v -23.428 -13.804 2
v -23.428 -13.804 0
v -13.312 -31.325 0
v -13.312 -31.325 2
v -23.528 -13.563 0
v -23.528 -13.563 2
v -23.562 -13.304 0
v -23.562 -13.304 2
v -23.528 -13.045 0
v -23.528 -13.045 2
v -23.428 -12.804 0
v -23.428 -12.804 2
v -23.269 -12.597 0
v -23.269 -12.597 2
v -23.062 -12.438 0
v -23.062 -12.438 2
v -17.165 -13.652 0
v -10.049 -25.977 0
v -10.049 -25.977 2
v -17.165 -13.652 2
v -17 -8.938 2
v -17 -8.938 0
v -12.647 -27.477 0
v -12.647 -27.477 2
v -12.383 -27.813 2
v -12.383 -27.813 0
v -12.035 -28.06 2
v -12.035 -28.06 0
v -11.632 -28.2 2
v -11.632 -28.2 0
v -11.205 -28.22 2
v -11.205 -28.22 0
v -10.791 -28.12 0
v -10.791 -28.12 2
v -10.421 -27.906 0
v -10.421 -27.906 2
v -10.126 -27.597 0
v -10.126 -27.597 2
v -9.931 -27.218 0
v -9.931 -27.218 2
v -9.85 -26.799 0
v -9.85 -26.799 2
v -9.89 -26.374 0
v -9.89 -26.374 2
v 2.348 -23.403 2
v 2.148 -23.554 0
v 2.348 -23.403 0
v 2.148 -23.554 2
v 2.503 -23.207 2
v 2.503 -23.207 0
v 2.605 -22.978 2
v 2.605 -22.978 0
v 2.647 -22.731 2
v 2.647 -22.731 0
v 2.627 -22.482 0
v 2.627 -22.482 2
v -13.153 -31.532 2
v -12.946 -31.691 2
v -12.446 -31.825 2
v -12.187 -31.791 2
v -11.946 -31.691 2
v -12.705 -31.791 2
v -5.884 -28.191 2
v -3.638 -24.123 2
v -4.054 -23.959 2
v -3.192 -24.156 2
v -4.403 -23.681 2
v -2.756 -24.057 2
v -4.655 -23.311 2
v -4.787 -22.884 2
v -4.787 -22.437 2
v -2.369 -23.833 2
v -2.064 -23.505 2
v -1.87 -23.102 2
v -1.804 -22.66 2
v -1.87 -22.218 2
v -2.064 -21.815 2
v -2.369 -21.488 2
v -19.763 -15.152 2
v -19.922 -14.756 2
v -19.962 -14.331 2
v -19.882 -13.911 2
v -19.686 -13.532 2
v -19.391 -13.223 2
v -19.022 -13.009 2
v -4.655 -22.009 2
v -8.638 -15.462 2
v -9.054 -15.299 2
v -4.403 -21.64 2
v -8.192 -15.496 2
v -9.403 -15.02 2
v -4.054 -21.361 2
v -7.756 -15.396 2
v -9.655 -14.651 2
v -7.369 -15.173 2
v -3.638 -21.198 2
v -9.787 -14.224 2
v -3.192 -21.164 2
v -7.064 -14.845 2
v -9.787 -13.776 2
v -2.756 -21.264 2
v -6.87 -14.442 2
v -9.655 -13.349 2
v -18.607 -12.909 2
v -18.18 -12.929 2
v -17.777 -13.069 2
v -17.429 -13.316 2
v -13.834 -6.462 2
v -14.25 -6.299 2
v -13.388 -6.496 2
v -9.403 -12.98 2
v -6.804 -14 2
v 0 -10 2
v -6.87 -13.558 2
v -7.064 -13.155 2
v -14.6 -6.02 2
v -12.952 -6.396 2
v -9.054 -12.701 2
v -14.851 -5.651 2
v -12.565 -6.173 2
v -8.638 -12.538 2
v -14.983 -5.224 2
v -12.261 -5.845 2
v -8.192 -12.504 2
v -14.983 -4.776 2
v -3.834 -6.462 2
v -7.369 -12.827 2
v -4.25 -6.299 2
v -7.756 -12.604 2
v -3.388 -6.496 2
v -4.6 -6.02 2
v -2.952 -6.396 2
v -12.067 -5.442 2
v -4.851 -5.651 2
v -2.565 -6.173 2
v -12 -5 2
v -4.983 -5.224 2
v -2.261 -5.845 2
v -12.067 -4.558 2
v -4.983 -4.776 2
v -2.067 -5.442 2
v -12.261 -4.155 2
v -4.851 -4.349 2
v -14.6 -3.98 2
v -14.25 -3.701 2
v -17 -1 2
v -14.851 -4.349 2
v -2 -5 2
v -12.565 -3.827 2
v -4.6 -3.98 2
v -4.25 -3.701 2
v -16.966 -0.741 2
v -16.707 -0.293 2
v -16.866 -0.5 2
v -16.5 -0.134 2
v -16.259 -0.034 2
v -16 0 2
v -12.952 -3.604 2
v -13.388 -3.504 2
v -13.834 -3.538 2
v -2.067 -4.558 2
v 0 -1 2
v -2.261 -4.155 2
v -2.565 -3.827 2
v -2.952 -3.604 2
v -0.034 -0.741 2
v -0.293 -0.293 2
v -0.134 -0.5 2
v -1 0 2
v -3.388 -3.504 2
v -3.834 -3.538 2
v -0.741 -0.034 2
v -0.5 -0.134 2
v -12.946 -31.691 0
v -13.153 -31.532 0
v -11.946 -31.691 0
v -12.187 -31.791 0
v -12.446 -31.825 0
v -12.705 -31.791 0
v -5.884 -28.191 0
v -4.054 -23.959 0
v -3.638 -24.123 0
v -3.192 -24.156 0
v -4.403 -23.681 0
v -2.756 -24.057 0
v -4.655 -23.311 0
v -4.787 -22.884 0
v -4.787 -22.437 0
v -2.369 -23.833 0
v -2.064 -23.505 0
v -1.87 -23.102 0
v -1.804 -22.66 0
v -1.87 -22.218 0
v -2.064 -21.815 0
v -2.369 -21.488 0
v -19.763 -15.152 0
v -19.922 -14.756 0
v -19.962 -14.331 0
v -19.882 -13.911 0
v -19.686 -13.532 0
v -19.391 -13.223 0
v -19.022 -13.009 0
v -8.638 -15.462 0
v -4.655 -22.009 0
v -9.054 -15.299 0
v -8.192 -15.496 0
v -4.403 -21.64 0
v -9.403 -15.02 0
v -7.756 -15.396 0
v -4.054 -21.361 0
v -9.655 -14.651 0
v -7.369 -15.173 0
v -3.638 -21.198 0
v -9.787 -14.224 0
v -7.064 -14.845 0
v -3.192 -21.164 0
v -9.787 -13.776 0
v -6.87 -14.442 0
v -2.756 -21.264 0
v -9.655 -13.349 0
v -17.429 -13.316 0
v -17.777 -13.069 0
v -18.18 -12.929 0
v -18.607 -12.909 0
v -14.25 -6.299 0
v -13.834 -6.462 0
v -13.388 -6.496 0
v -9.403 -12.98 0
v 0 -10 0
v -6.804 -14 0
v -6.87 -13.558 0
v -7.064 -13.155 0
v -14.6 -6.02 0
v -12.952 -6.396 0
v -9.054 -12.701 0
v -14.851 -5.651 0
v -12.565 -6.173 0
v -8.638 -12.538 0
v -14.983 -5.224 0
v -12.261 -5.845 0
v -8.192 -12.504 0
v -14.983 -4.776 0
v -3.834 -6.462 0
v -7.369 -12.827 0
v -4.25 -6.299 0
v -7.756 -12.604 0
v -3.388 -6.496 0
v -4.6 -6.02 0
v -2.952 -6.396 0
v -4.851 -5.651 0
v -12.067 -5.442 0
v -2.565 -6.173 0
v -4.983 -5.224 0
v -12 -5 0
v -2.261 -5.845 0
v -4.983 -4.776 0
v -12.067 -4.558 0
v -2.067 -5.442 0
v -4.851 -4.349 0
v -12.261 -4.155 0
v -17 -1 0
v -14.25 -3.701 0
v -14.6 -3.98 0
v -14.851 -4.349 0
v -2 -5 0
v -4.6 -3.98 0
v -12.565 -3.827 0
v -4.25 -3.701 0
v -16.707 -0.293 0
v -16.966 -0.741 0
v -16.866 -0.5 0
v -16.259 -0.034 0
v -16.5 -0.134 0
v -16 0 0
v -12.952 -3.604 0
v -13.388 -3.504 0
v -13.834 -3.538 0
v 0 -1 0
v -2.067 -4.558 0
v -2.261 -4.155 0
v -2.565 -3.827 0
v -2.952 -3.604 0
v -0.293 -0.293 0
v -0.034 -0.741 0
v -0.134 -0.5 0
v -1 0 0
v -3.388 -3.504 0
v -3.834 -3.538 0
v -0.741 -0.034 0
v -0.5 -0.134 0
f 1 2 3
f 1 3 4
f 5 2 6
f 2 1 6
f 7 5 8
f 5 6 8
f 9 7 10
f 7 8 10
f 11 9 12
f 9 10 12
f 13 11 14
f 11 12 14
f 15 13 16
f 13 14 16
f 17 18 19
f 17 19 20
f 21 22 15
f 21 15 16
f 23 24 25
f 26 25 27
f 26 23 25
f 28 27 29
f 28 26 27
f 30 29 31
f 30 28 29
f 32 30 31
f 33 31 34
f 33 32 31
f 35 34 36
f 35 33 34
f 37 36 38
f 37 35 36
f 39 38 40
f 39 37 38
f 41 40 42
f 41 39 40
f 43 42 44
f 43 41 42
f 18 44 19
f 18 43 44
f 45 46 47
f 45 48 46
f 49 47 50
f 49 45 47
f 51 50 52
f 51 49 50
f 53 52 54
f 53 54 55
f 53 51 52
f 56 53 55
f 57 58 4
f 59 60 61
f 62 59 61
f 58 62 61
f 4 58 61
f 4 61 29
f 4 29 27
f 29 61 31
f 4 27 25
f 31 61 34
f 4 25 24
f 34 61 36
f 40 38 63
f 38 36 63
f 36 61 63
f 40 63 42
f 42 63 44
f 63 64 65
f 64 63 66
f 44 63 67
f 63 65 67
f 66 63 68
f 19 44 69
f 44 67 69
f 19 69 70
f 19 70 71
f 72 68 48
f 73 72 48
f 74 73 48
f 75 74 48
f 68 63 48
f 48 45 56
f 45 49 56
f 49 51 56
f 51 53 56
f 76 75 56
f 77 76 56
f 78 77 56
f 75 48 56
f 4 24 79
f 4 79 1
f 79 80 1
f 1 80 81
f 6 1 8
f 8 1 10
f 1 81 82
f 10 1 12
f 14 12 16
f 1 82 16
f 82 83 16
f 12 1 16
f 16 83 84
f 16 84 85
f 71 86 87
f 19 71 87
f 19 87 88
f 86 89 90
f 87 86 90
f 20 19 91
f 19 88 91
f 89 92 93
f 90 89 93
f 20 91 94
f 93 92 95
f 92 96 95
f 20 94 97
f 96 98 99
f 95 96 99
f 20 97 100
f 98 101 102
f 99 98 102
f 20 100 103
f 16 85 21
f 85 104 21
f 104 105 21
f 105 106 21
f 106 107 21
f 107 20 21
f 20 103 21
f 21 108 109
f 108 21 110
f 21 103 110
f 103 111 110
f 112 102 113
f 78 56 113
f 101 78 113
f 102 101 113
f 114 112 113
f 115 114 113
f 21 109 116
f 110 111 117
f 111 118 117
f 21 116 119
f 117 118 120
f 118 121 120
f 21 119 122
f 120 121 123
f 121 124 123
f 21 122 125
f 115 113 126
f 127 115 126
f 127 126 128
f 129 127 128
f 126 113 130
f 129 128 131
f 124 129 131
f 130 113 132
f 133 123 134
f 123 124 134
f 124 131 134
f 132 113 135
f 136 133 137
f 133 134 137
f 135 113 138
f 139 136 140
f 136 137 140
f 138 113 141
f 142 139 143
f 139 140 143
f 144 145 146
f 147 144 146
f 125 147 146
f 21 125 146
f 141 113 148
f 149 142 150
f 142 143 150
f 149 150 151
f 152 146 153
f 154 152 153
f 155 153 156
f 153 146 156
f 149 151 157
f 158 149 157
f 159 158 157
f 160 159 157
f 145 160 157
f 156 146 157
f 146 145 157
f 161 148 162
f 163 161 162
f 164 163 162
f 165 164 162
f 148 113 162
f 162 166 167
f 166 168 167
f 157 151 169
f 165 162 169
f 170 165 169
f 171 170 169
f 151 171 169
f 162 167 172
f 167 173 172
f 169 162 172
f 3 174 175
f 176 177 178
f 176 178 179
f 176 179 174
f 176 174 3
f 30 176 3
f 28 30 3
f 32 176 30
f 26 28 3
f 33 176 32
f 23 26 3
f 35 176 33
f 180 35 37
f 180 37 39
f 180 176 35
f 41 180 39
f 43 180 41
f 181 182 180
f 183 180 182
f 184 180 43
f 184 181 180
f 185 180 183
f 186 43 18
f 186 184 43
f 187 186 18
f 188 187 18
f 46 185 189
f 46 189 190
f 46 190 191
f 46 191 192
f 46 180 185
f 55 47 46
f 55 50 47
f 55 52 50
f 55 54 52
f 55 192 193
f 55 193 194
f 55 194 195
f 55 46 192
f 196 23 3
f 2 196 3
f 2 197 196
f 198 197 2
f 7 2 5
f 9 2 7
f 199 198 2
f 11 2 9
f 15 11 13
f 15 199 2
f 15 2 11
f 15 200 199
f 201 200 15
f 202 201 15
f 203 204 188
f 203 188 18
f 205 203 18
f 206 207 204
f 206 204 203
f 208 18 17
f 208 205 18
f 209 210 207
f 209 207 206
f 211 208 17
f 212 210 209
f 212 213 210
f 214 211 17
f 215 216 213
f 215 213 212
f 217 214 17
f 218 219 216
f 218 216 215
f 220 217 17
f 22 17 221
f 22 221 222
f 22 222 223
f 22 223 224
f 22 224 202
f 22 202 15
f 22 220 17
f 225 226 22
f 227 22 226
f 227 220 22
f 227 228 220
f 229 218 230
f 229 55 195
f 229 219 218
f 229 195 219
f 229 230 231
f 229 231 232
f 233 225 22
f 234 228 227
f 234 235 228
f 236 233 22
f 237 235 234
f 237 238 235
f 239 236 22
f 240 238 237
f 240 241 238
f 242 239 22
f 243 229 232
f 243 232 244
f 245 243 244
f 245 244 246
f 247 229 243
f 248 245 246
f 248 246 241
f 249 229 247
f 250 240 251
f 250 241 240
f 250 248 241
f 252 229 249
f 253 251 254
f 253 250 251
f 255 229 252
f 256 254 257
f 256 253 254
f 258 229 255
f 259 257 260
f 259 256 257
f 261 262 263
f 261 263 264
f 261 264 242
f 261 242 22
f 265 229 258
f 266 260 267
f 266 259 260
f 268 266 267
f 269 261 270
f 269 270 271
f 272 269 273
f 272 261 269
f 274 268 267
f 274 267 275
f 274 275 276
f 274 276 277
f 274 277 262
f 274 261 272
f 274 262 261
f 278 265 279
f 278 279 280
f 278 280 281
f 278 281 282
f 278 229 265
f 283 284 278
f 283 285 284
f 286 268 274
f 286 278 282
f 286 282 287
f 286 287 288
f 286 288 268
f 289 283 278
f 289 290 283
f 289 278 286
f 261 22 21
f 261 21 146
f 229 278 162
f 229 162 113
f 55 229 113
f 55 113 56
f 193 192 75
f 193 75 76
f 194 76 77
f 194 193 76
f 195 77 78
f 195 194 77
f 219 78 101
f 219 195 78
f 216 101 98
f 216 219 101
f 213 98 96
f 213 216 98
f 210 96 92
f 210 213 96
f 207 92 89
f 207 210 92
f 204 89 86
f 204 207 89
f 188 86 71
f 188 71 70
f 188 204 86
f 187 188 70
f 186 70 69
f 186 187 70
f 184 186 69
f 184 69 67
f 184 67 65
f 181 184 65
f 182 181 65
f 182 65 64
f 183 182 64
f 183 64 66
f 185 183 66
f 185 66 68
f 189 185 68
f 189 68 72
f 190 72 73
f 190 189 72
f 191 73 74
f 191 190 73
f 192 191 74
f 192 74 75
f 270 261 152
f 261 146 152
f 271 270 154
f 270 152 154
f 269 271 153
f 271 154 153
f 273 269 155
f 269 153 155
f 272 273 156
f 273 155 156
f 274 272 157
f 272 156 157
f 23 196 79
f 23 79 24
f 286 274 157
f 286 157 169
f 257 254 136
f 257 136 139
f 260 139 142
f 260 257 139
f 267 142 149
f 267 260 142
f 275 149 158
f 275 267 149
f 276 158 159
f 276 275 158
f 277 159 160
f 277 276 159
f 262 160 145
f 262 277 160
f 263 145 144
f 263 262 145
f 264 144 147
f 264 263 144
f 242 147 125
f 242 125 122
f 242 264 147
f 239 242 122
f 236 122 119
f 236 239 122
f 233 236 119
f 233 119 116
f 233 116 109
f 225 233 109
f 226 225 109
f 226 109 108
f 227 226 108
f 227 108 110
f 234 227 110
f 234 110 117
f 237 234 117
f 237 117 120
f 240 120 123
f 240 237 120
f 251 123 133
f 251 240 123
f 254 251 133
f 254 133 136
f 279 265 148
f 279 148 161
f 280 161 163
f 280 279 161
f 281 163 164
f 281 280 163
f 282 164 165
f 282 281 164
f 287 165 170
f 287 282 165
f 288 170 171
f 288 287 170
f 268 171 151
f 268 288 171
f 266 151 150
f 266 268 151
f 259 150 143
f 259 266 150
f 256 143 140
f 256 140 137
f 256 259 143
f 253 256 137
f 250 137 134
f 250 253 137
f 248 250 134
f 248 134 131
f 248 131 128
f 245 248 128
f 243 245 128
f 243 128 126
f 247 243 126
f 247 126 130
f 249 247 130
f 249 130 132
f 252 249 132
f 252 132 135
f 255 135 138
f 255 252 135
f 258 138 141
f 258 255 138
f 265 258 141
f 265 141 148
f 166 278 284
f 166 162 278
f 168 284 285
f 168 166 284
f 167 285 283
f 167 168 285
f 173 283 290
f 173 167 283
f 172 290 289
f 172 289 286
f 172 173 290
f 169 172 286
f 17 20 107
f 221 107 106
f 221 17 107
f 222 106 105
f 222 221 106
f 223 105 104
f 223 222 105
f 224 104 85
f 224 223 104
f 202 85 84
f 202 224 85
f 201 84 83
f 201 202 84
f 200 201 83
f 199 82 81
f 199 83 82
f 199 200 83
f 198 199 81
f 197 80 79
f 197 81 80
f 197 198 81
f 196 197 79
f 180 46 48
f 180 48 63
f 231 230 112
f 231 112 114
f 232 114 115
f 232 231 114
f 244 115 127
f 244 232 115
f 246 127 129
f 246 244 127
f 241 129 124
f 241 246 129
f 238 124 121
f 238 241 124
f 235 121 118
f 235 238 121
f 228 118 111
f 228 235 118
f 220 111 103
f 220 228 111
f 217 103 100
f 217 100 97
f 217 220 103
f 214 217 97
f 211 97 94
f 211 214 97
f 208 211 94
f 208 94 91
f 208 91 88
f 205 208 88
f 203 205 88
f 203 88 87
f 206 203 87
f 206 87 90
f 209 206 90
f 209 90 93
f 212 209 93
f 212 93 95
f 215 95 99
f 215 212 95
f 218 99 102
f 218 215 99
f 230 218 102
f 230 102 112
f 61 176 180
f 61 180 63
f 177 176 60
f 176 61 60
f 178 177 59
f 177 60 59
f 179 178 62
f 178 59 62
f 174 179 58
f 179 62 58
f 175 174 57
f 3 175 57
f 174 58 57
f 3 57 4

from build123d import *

# Parameters (mm, degrees)
SKETCH_1_R          = 1.5
EXTRUDE_1_DEPTH     = 2
SKETCH_2_W          = 2
SKETCH_2_H          = 22.232050807
EXTRUDE_2_DEPTH     = 8
CUT_EXTRUDE_1_DEPTH = 5
FILLET_1_R          = 1


with BuildPart() as part:
    # 草图1 → 凸台-拉伸1 (new body)
    with BuildSketch(Plane.XY):
        Polygon((-17, 0), (0, 0), (0, -10), (2.776279442, -23.191342951), (-5.883974596, -28.191342951), (-17, -8.937822174), align=None)
        with Locations((-3.303847577, -22.660254038)):
            Circle(SKETCH_1_R, mode=Mode.SUBTRACT)
        with Locations((-13.5, -5)):
            Circle(SKETCH_1_R, mode=Mode.SUBTRACT)
        with Locations((-8.303847577, -14)):
            Circle(SKETCH_1_R, mode=Mode.SUBTRACT)
        with Locations((-3.5, -5)):
            Circle(SKETCH_1_R, mode=Mode.SUBTRACT)
    extrude(amount=EXTRUDE_1_DEPTH)

    # 草图2 → 凸台-拉伸2 (add)
    with BuildSketch(Plane(origin=(-16.620190528, -9.595671476, 0), x_dir=(0, 0, 1), z_dir=(-0.866025404, -0.5, 0))):
        with Locations((1, -10.356406461)):
            Rectangle(SKETCH_2_W, SKETCH_2_H)
    extrude(amount=EXTRUDE_2_DEPTH)

    # 草图3 → 切除-拉伸1 (cut)
    with BuildSketch(Plane(origin=(0, 0, 0), x_dir=(-1, 0, 0), z_dir=(0, 0, -1))):
        with BuildLine():
            Line((10.049038106, -25.977241336), (17.165063509, -13.651923789))
            ThreePointArc((17.165063509, -13.651923789), (19.214101615, -13.102885683), (19.763139721, -15.151923789))
            Line((19.763139721, -15.151923789), (12.647114317, -27.477241336))
            ThreePointArc((12.647114317, -27.477241336), (10.598076211, -28.026279442), (10.049038106, -25.977241336))
        make_face()
    extrude(amount=-CUT_EXTRUDE_1_DEPTH, mode=Mode.SUBTRACT)

    # 圆角1
    fillet_1_edges = [part.edges().sort_by_distance(p)[0] for p in [
        (2.776279442, -23.191342951, 1),
        (-17, 0, 1),
        (0, 0, 1),
        (-23.92820323, -12.937822174, 1),
        (-12.812177826, -32.191342951, 1),
    ]]
    fillet(fillet_1_edges, radius=FILLET_1_R)


solid = part.part
